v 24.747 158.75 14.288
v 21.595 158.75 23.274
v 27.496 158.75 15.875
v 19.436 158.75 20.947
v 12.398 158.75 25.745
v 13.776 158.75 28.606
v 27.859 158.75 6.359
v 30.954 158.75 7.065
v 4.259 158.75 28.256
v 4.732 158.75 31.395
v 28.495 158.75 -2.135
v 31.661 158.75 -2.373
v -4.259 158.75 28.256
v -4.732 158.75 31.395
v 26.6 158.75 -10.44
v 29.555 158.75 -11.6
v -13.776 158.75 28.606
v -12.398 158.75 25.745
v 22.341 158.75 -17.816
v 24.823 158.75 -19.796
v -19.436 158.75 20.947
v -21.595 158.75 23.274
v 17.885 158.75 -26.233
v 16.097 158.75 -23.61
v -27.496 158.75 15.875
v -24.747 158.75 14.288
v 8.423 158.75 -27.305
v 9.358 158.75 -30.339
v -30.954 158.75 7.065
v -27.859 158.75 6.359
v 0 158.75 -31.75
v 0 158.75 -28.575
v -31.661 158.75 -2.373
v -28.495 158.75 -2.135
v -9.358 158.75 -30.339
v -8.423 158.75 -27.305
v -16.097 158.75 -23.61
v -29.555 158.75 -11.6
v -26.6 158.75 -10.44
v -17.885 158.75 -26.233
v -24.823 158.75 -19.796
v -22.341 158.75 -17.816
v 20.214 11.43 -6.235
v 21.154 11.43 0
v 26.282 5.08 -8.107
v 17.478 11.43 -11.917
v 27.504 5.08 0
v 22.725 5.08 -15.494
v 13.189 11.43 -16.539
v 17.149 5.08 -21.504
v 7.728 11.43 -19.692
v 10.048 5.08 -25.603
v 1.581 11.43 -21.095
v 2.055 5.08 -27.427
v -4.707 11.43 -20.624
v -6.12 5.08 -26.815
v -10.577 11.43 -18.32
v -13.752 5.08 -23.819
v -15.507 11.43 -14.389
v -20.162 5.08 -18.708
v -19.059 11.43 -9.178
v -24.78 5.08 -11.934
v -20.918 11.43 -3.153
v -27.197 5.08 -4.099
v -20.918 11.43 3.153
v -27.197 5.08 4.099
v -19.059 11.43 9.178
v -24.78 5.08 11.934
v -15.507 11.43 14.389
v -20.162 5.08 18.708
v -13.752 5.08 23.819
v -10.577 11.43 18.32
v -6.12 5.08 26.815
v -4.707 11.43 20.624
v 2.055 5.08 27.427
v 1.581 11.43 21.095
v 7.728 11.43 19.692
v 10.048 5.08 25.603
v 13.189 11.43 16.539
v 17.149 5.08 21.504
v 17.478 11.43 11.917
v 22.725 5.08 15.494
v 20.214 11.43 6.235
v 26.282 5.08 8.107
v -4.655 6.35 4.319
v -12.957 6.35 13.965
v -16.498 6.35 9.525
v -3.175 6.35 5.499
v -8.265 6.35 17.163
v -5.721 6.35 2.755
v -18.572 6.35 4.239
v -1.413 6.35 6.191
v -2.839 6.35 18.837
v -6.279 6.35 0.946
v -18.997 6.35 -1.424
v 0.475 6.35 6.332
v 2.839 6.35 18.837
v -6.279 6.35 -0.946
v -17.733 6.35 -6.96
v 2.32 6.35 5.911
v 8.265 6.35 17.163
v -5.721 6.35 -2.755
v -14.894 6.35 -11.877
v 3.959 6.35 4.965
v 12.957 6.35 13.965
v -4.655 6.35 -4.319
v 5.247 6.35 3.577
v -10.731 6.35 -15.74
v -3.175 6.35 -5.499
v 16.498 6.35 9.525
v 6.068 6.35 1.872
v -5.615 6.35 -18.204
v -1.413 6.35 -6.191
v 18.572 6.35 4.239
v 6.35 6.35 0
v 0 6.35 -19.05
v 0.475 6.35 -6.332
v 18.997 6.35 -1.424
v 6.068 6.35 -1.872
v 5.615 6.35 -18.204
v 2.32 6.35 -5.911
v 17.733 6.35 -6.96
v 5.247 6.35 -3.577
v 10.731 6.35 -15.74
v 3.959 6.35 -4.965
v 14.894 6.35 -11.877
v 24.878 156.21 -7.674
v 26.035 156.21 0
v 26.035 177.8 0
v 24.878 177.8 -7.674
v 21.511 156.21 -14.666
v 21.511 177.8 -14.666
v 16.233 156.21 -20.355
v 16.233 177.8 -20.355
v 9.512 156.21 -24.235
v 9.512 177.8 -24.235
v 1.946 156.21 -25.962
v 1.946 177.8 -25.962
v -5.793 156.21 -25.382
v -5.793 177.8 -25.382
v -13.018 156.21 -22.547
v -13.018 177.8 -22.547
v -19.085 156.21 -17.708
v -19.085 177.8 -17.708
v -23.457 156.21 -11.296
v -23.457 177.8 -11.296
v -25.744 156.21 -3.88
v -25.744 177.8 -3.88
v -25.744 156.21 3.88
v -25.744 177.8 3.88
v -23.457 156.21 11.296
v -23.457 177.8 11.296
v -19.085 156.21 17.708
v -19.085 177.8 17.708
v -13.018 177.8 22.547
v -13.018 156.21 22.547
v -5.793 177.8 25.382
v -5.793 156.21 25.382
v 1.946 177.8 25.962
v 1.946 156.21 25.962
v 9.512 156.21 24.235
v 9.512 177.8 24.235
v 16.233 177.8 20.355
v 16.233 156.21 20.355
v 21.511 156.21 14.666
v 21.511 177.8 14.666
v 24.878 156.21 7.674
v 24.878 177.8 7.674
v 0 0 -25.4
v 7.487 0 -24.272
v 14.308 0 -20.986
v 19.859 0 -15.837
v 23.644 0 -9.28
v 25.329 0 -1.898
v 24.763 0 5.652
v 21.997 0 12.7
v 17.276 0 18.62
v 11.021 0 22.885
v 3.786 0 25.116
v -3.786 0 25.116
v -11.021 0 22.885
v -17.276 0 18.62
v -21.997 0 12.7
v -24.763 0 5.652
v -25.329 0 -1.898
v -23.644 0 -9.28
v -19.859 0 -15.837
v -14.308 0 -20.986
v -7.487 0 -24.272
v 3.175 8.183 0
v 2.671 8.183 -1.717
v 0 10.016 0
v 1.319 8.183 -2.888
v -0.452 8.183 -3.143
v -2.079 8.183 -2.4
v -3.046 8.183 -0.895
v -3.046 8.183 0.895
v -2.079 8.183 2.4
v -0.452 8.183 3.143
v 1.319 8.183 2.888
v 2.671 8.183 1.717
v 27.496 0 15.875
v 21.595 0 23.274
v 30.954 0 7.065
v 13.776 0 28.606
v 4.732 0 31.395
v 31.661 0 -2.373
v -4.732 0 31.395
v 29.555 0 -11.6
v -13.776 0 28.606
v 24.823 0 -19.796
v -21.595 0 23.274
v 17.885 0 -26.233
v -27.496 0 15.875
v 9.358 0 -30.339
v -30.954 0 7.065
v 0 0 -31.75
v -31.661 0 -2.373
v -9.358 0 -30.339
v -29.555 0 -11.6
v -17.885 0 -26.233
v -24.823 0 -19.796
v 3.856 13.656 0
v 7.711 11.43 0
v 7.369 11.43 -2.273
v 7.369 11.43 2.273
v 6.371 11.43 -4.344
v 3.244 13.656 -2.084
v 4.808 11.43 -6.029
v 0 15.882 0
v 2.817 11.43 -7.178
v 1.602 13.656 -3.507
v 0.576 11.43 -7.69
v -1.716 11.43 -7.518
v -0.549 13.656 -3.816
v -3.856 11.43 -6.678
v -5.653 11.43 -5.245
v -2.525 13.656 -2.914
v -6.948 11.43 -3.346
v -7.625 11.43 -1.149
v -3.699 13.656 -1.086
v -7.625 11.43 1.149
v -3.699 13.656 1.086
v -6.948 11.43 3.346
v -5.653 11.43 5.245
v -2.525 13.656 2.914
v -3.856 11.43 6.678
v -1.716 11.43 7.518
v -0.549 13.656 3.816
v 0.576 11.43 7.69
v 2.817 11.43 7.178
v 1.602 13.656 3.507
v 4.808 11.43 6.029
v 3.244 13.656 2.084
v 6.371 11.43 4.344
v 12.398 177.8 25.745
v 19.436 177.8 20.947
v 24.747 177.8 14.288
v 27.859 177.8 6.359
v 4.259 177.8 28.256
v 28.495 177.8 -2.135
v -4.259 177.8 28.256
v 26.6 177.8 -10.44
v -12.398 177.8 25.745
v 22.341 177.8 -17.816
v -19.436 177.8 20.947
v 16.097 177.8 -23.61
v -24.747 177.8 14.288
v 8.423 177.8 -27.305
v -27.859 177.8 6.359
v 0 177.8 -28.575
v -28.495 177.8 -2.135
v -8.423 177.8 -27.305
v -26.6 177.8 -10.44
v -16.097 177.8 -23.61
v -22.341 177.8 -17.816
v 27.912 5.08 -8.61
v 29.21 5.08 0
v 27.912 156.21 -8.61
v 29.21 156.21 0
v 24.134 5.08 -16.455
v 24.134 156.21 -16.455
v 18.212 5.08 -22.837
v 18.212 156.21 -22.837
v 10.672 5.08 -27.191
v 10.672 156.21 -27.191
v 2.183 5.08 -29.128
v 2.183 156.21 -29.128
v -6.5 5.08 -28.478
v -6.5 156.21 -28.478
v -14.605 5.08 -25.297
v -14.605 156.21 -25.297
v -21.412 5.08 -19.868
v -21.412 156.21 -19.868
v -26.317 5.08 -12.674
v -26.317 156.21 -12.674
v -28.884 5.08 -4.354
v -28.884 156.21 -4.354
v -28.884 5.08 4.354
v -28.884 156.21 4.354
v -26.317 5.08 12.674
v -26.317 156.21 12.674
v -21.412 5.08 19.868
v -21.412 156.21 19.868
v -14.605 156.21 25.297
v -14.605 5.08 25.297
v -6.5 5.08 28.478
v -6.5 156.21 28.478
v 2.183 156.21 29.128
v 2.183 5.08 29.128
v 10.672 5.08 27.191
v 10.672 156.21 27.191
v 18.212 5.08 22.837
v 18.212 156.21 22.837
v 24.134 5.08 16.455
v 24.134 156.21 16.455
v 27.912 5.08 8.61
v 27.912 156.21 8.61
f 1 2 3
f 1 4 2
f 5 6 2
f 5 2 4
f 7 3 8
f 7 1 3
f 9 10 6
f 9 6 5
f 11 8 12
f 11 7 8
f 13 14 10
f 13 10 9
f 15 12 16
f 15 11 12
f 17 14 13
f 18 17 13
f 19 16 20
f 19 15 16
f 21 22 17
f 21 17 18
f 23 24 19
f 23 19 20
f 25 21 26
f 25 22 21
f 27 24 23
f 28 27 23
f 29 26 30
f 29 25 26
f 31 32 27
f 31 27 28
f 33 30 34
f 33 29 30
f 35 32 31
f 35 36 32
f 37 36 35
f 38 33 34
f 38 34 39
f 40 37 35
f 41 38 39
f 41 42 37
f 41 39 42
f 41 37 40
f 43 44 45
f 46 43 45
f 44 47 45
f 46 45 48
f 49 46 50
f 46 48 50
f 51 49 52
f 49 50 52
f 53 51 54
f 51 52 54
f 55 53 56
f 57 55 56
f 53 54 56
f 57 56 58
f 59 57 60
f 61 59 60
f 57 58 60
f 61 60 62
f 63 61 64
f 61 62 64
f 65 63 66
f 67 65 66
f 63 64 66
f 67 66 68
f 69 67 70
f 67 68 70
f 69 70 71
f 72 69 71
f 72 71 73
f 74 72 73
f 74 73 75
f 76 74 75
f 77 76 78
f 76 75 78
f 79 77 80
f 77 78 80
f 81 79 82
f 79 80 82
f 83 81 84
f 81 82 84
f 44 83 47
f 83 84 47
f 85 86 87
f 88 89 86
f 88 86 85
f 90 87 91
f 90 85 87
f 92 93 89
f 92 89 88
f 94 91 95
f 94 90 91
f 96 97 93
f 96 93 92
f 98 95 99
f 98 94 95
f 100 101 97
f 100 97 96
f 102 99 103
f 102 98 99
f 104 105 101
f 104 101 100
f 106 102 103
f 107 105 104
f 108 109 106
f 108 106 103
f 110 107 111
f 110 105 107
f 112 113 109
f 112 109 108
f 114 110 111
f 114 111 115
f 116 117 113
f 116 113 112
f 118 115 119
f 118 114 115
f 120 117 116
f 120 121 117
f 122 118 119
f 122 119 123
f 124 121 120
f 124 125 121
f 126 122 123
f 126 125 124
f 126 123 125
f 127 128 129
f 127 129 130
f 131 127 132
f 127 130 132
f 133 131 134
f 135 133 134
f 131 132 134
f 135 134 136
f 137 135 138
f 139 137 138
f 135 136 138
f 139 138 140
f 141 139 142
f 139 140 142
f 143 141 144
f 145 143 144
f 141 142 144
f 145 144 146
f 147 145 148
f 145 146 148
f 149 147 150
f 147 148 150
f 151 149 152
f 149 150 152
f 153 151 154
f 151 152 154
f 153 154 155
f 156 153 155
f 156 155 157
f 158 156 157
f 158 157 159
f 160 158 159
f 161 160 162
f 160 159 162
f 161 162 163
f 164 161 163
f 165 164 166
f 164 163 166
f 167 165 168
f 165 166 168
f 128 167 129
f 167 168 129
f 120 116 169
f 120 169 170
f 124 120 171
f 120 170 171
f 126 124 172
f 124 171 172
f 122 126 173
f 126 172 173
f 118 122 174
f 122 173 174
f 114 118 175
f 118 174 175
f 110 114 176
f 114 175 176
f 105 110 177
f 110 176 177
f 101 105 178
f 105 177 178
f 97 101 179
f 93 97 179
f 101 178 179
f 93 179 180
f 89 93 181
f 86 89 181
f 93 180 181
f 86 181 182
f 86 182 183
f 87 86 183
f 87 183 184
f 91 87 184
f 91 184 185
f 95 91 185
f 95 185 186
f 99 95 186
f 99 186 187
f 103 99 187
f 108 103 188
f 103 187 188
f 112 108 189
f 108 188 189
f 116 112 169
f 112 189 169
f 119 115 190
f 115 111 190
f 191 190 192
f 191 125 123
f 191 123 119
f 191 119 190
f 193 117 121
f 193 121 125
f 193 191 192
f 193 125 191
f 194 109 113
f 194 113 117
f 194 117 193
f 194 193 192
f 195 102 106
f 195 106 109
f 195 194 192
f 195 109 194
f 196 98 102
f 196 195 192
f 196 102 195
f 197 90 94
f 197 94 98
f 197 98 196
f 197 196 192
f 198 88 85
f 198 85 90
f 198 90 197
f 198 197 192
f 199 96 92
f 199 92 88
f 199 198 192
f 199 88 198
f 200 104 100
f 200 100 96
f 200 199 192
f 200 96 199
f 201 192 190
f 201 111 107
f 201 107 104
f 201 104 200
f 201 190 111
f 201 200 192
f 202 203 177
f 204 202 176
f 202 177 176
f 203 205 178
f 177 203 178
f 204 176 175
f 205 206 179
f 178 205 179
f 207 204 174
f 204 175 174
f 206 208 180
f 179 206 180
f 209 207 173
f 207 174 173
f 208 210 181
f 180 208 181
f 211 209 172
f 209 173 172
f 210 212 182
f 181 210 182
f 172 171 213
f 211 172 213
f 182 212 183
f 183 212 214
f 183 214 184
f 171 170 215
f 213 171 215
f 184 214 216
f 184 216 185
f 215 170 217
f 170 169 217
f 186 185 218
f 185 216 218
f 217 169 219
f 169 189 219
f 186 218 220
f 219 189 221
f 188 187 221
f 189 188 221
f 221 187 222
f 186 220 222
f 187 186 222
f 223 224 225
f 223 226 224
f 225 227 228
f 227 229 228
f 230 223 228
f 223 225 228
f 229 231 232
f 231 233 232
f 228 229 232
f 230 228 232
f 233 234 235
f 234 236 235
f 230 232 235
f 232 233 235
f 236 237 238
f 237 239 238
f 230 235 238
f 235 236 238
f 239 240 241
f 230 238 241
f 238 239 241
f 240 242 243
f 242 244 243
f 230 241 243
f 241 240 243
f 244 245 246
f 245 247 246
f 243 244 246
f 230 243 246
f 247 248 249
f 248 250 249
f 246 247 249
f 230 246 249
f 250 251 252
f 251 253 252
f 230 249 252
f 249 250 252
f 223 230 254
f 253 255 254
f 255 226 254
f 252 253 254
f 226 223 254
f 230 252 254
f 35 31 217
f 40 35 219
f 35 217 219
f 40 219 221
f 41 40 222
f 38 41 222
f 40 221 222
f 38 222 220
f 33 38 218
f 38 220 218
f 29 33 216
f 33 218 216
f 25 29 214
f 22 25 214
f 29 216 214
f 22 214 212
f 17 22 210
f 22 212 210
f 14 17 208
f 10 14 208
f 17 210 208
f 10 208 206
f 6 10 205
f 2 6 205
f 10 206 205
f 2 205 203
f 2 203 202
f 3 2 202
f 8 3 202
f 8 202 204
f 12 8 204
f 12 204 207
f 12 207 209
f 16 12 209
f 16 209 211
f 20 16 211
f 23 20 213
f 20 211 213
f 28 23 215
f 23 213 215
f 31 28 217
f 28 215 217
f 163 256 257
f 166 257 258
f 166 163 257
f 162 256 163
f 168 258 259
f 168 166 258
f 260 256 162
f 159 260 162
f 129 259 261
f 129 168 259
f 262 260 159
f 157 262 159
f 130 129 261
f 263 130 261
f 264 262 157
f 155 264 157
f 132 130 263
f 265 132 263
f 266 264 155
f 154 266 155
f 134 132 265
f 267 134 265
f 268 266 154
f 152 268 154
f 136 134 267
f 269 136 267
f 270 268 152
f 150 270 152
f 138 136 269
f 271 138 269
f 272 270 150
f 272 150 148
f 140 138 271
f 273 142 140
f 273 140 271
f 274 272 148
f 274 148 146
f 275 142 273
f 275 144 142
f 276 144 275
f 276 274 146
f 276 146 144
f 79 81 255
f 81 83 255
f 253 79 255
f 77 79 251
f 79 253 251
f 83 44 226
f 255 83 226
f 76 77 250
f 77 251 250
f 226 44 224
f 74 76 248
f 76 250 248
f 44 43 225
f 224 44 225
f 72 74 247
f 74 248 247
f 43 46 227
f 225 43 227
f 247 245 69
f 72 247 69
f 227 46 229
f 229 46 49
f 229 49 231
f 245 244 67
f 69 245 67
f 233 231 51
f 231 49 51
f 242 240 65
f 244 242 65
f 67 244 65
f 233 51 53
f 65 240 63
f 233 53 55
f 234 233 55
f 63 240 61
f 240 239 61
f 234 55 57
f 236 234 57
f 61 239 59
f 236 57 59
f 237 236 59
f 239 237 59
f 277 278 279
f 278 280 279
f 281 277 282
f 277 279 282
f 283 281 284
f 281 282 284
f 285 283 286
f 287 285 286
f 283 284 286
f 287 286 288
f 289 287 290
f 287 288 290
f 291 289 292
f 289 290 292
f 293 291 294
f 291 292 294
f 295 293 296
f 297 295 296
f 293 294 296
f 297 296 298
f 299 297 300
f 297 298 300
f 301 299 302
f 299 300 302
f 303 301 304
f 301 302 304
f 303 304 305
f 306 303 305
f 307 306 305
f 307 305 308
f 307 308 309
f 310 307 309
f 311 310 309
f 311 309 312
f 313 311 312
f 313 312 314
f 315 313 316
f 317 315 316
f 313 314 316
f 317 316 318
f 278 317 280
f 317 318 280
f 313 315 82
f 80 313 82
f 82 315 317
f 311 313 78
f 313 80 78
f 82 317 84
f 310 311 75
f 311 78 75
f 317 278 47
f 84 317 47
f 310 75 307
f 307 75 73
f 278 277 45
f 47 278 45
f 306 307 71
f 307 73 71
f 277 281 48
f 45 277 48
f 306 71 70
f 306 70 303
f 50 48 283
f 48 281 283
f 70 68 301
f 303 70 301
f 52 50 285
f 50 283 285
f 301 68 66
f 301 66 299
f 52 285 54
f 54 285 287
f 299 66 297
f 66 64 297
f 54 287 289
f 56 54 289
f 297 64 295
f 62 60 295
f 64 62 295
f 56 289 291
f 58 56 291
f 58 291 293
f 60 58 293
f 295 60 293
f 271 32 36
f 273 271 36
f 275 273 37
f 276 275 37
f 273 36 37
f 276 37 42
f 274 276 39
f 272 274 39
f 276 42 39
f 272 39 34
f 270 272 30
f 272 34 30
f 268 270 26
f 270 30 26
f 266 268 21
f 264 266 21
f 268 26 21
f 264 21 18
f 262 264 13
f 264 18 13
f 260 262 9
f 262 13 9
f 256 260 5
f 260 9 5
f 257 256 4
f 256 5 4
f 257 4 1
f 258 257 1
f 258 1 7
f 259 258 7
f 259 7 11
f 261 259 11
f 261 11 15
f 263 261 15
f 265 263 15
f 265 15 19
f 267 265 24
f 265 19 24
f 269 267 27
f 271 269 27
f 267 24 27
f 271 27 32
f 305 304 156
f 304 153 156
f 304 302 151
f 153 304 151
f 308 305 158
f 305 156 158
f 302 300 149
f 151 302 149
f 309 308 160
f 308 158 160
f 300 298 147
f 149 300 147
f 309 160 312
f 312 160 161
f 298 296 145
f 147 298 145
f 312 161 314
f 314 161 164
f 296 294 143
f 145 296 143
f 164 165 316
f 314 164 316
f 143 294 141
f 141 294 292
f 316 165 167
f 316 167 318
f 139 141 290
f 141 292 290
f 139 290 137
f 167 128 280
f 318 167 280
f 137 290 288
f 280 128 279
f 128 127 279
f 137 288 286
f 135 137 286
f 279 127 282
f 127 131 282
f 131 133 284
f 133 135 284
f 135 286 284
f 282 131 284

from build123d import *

# Parameters (mm, degrees)
SKETCH2_R           = 31.75
BOSS_EXTRUDE1_DEPTH = 158.75
SKETCH3_R           = 28.575
BOSS_EXTRUDE2_DEPTH = 19.05
SKETCH4_R           = 25.4
CUT_EXTRUDE1_DEPTH  = 6.35
SKETCH5_R           = 6.35
CUT_EXTRUDE2_DEPTH  = 5.08
DRAFT2_ANGLE        = 45


# Read off the part's stored shape, not the designer's step: Draft3, Shell1
with BuildPart() as part:
    # Sketch2 → Boss-Extrude1 (new body)
    with BuildSketch(Plane(origin=(0, 0, 0), x_dir=(1, 0, 0), z_dir=(0, 1, 0))):
        with Locations(Location((0, 0, 0), (0, 0, 90))):
            Circle(SKETCH2_R)
    extrude(amount=BOSS_EXTRUDE1_DEPTH)

    # Sketch3 → Boss-Extrude2 (add)
    with BuildSketch(Plane(origin=(0, 158.75, 0), x_dir=(1, 0, 0), z_dir=(0, 1, 0))):
        with Locations(Location((0, 0, 0), (0, 0, 90))):
            Circle(SKETCH3_R)
    extrude(amount=BOSS_EXTRUDE2_DEPTH)

    # Sketch4 → Cut-Extrude1 (cut)
    with BuildSketch(Plane.XZ):
        with Locations(Location((0, 0, 0), (0, 0, 270))):
            Circle(SKETCH4_R)
    extrude(amount=-CUT_EXTRUDE1_DEPTH, mode=Mode.SUBTRACT)

    # Sketch5 → Cut-Extrude2 (cut)
    with BuildSketch(Plane.XZ.offset(-6.35)):
        with Locations(Location((0, 0, 0), (0, 0, 270))):
            Circle(SKETCH5_R)
    extrude(amount=-CUT_EXTRUDE2_DEPTH, mode=Mode.SUBTRACT)

    # Draft2
    draft2_faces = [part.faces().sort_by_distance(p)[0] for p in [
        (0, 3.175, 25.4),
    ]]
    draft(draft2_faces, Plane(origin=(0, 0, 0), x_dir=(0, 0, -1), z_dir=(0, -1, 0)), DRAFT2_ANGLE)

    # Draft3 outline → Draft3 (revolve)
    with BuildSketch(Plane.XY):
        Polygon((6.35, 6.35), (6.35, 11.43), (0, 11.43), (0, 10.016174209), align=None)
    revolve(axis=Axis((0, 0, 0), (0, 1, 0)))

    # Shell1 outline → Shell1 (revolve, cut)
    with BuildSketch(Plane.XY):
        Polygon((29.21, 156.21), (26.035, 156.21), (26.035, 177.8), (0, 177.8), (0, 15.882052944), (7.711181898, 11.43), (21.154204897, 11.43), (27.504204897, 5.08), (29.21, 5.08), align=None)
    revolve(axis=Axis((0, 0, 0), (0, 1, 0)), mode=Mode.SUBTRACT)


solid = part.part
